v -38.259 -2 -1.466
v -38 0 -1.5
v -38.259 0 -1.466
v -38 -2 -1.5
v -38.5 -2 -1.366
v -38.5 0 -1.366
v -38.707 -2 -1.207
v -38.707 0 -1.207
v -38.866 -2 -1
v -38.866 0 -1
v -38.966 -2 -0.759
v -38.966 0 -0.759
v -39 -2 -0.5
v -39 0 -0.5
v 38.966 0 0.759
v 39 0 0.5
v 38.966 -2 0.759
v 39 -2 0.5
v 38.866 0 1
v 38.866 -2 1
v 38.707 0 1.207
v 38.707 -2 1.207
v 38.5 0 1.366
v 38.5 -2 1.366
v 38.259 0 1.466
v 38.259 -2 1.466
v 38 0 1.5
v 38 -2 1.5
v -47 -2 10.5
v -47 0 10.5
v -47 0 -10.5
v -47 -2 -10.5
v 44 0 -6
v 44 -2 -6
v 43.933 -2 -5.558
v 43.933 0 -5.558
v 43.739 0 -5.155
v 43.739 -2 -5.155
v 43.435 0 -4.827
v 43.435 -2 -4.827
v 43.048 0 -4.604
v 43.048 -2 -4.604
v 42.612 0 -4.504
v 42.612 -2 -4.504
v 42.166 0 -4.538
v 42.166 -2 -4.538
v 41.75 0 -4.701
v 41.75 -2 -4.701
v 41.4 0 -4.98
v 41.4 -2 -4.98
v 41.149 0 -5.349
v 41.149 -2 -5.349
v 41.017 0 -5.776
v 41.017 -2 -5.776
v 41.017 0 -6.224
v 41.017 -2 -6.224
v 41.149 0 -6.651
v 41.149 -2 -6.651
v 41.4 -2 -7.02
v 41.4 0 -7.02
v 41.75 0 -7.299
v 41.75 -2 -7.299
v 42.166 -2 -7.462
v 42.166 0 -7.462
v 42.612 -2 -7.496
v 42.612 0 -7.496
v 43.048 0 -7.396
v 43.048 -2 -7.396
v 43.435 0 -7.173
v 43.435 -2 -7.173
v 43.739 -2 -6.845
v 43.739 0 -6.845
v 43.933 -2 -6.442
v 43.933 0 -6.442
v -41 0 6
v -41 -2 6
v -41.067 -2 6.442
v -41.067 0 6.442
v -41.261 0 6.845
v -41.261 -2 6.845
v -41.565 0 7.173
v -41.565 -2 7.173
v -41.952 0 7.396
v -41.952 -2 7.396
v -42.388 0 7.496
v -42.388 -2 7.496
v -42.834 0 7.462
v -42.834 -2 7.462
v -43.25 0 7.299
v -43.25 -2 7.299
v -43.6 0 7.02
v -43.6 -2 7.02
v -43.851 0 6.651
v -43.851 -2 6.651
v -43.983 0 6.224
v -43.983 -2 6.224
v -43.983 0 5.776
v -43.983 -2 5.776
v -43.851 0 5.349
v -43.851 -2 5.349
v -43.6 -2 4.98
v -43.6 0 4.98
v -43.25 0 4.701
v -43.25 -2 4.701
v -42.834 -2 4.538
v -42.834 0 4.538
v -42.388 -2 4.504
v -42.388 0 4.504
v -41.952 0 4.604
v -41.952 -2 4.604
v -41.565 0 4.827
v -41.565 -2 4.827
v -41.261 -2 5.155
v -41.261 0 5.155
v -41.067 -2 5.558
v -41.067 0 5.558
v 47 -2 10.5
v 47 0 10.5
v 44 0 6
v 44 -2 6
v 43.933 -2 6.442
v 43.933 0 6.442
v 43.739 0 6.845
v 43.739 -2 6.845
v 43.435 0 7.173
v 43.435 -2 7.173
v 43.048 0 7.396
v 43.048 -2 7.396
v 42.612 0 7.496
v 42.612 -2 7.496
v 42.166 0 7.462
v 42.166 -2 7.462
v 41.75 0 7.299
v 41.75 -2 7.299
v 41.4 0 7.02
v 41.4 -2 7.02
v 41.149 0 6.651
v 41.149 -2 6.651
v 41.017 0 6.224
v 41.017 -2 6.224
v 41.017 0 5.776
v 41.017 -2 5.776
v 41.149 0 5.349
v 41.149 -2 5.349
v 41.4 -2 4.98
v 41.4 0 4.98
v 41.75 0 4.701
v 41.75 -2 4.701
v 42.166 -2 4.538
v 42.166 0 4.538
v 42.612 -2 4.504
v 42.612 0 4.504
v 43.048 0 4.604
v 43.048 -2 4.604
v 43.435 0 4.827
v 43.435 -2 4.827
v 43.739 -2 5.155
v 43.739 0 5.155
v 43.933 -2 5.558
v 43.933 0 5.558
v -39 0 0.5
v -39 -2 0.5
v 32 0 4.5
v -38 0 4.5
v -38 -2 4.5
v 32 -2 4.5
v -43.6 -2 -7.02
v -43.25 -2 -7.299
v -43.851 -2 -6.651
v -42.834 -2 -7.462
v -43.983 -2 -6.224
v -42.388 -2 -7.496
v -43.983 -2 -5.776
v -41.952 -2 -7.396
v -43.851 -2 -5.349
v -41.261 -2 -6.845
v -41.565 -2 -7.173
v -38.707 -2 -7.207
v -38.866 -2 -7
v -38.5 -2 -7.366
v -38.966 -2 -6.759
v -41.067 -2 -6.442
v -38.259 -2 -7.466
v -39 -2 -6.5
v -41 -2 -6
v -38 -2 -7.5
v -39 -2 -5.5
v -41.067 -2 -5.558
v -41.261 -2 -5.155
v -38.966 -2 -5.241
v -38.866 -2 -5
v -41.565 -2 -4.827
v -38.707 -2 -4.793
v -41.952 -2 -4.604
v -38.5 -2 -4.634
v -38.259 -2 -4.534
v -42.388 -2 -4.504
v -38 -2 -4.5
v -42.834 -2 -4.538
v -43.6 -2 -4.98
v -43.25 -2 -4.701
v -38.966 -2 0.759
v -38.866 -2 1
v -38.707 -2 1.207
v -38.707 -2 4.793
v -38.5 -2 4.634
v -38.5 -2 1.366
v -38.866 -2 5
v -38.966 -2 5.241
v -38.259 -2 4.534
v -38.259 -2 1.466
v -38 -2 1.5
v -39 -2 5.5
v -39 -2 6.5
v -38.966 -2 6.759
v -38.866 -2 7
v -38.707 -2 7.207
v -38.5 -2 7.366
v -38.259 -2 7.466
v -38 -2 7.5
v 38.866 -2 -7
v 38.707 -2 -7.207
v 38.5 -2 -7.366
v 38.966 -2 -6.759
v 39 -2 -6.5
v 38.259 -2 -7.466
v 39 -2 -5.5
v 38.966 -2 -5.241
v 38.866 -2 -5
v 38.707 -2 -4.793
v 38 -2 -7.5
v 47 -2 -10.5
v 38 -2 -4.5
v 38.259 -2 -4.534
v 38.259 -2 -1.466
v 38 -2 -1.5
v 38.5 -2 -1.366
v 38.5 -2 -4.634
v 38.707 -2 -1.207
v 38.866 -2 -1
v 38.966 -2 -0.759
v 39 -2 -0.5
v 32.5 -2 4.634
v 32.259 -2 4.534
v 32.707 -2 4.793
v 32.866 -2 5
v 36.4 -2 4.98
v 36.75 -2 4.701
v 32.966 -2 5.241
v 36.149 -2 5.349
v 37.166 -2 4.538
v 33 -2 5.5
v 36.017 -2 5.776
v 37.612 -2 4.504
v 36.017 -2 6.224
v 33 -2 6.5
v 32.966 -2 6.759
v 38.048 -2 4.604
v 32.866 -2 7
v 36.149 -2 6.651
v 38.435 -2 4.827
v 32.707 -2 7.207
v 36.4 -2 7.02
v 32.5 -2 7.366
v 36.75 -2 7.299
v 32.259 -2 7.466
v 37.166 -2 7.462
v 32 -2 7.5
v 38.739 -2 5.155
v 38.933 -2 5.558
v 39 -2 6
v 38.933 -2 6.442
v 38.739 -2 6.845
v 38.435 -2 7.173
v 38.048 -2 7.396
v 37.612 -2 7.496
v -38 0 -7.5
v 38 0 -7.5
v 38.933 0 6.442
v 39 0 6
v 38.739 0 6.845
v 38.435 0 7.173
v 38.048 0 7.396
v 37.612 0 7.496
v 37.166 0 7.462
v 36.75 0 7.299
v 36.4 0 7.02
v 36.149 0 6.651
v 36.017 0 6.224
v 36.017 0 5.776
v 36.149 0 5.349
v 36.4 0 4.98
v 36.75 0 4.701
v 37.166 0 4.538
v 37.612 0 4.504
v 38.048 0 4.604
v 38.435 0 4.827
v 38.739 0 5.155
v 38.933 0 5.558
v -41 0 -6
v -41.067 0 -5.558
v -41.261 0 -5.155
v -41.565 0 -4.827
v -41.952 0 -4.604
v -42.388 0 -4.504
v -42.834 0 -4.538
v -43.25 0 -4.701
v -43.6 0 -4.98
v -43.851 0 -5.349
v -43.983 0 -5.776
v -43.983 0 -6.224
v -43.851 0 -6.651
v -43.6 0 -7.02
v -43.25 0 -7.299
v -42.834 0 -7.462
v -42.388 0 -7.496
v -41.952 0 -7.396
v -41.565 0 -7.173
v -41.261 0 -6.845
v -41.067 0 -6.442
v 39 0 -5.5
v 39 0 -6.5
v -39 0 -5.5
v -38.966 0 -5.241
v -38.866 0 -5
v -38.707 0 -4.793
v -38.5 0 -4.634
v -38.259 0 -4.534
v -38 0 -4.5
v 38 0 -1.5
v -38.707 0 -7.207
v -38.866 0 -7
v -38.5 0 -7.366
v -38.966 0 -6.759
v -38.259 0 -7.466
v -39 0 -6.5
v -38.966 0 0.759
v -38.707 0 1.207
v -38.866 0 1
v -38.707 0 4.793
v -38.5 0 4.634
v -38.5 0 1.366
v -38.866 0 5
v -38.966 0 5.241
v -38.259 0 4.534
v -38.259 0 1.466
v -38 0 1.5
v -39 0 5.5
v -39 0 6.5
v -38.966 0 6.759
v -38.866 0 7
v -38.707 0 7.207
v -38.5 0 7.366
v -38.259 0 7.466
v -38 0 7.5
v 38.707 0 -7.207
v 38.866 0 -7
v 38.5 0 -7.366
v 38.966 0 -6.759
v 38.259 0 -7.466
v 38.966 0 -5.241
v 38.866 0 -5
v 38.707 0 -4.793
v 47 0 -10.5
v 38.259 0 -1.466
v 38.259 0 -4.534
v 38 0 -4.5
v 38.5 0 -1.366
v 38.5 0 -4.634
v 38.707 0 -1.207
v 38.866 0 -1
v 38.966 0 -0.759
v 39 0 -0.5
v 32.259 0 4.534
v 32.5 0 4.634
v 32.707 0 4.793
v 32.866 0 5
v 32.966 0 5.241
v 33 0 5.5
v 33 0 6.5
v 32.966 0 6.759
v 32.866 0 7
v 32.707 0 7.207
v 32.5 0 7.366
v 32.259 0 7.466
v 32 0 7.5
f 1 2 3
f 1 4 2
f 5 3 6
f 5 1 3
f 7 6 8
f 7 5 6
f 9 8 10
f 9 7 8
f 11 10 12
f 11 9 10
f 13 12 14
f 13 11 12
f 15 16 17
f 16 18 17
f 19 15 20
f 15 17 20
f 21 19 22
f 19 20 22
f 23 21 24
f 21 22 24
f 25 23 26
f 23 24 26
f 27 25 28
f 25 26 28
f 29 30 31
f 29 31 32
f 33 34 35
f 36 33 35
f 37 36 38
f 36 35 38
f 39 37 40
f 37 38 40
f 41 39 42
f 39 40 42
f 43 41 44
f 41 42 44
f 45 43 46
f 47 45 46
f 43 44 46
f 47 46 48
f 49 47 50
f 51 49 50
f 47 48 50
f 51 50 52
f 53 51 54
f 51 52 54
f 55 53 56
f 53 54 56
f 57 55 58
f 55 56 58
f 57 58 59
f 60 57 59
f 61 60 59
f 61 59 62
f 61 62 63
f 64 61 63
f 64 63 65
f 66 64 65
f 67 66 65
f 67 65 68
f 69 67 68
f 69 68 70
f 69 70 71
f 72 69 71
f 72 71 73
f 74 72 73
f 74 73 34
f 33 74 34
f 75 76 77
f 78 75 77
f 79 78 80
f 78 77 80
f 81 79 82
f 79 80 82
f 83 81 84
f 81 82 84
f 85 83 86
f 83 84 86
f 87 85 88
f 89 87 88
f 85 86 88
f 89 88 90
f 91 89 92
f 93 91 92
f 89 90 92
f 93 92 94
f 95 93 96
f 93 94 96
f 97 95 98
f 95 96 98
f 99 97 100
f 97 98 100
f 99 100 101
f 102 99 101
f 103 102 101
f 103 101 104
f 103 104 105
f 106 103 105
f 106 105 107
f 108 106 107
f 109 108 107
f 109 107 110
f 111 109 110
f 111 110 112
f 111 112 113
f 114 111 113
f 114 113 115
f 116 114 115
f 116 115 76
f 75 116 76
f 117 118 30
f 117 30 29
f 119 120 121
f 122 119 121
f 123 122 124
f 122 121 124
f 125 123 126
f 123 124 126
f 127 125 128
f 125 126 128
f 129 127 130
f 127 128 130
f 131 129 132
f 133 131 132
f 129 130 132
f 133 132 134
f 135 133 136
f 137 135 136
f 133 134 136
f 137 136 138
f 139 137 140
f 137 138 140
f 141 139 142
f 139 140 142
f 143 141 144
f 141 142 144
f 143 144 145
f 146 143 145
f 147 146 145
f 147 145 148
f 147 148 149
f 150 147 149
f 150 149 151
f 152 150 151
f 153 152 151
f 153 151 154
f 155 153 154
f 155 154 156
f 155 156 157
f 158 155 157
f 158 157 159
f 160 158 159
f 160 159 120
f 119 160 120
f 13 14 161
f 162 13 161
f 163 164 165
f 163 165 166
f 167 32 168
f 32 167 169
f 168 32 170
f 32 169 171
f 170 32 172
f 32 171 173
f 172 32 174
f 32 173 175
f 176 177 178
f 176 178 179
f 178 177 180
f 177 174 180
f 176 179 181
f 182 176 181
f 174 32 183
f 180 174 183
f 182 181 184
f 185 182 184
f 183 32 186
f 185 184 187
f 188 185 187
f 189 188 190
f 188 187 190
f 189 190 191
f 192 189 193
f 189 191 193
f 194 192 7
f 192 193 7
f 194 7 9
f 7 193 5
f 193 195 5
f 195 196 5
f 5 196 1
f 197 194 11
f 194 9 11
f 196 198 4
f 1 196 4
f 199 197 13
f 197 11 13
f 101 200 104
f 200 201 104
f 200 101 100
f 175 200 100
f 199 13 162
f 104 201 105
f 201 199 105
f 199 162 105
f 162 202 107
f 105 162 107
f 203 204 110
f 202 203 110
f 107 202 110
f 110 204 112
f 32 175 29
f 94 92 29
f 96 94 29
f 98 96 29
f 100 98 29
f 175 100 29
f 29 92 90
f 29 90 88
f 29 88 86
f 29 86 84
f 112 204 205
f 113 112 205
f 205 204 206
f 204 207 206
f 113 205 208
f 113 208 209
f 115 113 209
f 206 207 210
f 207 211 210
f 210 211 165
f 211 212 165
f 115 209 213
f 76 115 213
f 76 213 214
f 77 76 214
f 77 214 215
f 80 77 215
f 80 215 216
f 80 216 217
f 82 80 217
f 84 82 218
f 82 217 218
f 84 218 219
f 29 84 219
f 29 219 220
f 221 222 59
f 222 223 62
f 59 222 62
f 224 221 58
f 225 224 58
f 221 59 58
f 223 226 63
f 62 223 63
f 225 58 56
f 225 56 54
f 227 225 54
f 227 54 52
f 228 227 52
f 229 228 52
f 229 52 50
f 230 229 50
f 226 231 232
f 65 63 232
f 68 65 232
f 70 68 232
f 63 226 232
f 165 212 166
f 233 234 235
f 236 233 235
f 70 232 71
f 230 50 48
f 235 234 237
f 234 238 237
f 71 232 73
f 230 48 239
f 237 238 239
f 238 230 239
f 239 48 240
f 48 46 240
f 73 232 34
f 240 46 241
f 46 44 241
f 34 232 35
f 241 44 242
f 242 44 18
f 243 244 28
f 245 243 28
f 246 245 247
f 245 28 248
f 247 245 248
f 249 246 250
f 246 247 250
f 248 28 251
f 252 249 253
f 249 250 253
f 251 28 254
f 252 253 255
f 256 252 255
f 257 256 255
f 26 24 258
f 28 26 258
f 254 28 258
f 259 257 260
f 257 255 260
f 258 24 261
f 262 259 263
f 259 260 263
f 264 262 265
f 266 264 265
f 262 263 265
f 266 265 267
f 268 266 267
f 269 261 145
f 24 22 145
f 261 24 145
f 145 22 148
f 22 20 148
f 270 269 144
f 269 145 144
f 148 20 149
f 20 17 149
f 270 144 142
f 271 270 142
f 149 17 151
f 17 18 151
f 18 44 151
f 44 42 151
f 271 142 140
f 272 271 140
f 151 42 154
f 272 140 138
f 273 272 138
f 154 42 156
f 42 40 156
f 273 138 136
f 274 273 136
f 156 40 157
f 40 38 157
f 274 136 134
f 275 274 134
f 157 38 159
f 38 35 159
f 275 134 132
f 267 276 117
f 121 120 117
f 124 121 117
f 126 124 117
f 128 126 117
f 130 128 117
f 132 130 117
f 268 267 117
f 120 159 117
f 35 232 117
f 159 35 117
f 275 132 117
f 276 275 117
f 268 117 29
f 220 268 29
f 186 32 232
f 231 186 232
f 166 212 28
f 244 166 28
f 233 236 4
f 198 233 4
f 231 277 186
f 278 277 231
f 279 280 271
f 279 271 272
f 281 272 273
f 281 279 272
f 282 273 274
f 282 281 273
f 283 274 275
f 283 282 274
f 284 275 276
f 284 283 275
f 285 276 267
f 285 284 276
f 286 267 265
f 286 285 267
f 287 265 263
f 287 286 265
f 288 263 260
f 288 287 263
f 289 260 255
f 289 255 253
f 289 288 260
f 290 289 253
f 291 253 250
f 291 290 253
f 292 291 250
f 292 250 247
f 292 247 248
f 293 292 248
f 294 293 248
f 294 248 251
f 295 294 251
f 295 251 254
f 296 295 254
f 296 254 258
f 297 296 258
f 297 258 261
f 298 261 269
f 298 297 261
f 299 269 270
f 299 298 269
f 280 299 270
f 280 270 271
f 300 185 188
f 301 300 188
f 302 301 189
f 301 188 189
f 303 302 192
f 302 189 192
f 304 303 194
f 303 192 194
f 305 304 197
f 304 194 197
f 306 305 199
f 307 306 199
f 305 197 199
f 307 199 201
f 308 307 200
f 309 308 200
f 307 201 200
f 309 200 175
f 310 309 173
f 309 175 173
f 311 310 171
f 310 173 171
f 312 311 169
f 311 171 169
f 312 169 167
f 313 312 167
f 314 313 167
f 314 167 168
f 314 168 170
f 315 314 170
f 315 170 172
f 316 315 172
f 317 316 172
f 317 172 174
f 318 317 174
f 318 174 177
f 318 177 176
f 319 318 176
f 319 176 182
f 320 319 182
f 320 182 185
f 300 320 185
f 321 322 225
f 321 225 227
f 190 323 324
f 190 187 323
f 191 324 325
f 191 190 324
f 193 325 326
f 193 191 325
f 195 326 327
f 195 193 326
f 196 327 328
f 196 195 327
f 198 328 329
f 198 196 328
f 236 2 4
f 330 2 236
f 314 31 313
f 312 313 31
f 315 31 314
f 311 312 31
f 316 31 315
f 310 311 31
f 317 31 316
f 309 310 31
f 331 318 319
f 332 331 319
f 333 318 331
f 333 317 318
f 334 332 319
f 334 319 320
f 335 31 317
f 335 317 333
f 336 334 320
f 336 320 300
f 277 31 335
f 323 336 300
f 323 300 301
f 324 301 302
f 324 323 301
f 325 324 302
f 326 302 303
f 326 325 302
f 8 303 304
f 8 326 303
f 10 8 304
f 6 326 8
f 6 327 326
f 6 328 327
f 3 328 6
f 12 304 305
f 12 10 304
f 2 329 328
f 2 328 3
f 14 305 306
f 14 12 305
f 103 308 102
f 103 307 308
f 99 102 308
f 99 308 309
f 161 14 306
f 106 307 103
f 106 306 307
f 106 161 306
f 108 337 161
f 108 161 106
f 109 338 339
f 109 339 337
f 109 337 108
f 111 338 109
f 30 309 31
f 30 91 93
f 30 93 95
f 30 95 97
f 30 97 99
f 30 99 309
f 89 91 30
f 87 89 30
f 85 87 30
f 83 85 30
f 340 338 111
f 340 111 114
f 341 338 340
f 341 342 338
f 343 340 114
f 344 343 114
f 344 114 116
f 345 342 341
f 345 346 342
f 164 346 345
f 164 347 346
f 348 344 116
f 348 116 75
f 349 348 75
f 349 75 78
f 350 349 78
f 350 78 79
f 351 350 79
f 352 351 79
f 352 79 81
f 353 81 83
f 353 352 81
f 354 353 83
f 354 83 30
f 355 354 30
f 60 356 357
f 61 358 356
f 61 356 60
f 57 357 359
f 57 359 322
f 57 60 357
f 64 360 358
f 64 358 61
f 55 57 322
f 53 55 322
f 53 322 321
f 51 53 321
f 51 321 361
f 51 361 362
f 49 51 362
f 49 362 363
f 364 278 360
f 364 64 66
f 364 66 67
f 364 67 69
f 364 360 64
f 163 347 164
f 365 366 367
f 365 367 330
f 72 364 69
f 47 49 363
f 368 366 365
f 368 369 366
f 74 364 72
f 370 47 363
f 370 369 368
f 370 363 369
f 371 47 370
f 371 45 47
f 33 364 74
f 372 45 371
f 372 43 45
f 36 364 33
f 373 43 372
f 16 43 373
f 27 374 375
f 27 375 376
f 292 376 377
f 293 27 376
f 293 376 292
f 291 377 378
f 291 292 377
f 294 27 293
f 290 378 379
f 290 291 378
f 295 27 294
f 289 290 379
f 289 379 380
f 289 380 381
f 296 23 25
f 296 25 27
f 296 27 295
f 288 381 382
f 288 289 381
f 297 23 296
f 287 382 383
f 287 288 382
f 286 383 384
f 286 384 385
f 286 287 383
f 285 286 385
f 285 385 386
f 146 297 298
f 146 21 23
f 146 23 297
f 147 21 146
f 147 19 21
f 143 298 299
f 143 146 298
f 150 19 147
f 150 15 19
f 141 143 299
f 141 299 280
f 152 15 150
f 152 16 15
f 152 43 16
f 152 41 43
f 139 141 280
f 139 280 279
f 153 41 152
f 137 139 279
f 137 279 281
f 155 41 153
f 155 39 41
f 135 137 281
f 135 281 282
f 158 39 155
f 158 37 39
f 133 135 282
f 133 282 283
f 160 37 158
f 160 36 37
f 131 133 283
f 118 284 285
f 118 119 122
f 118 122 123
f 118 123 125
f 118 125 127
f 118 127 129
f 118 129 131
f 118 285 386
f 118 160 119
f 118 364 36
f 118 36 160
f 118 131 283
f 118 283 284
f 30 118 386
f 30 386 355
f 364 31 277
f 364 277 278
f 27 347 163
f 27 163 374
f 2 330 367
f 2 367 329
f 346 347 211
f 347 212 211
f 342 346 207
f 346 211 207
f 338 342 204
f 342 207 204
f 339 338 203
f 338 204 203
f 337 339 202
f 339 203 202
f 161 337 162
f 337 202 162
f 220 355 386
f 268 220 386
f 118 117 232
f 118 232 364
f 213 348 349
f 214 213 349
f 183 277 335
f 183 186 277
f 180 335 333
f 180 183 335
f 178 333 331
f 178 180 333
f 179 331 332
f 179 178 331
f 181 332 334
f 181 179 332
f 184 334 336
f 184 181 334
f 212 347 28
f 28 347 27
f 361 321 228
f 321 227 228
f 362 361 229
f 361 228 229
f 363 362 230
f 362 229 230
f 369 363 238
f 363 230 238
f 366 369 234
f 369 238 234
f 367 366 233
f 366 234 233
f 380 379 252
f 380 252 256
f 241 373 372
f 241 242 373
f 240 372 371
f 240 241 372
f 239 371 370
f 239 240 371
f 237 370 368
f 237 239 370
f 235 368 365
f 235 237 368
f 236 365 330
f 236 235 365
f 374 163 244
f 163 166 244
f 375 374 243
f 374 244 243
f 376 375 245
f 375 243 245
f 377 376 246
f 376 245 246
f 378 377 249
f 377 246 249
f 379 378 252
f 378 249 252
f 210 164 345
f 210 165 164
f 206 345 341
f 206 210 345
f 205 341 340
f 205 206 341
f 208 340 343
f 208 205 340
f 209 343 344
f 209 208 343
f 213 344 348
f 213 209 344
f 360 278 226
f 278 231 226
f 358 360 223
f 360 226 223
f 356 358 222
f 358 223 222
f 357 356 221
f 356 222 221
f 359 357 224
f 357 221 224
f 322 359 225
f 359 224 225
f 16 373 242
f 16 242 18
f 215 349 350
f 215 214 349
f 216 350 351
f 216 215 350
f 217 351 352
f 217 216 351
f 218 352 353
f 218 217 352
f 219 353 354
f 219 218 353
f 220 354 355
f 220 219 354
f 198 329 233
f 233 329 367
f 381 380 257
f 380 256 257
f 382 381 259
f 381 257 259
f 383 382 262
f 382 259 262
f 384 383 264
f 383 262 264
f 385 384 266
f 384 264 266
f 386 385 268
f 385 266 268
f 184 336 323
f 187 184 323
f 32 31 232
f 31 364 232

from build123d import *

# Parameters (mm, degrees)
F0_W     = 84
F0_H     = 21
F0_W_2   = 78
F0_H_2   = 3
F0_W_3   = 72
F0_R     = 1.5
F1_DEPTH = 2
F2_W     = 2
F2_H     = 21
F3_DEPTH = 5
F4_W     = 2
F4_H     = 21
F5_DEPTH = 5
F6_R     = 1.5
F7_DEPTH = 25
F8_R     = 1


with BuildPart() as f1:
    # F0 (on Front) → F1 (new body)
    with BuildSketch(Plane.XZ):
        Rectangle(F0_W, F0_H)
        with Locations((0, -6)):
            Rectangle(F0_W_2, F0_H_2, mode=Mode.SUBTRACT)
        with Locations((-3, 6)):
            Rectangle(F0_W_3, F0_H_2, mode=Mode.SUBTRACT)
        Rectangle(F0_W_2, F0_H_2, mode=Mode.SUBTRACT)
        with Locations((37.5, 6)):
            Circle(F0_R, mode=Mode.SUBTRACT)
    extrude(amount=F1_DEPTH)

    # F2 (on face) → F3 (join)
    with BuildSketch(Plane.YZ.offset(42)):
        with Locations((-1, 0)):
            Rectangle(F2_W, F2_H)
    extrude(amount=F3_DEPTH)

    # F4 (on face) → F5 (join)
    with BuildSketch(Plane(origin=(-42, 0, 0), x_dir=(0, -1, 0), z_dir=(-1, 0, 0))):
        with Locations((1, 0)):
            Rectangle(F4_W, F4_H)
    extrude(amount=F5_DEPTH)

    # F6 (on face) → F7 (cut)
    with BuildSketch(Plane.XZ.offset(2)):
        with Locations((-42.5, 6)):
            Circle(F6_R)
        with Locations((-42.5, -6)):
            Circle(F6_R)
        with Locations((42.5, 6)):
            Circle(F6_R)
        with Locations((42.5, -6)):
            Circle(F6_R)
    extrude(amount=-F7_DEPTH, mode=Mode.SUBTRACT)

    # F8
    f8_edges = [f1.edges().sort_by_distance(p)[0] for p in [
        (-39, -1, 7.5),
        (-39, -1, 1.5),
        (-39, -1, -4.5),
        (-39, -1, 4.5),
        (-39, -1, -1.5),
        (-39, -1, -7.5),
        (33, -1, 7.5),
        (39, -1, 1.5),
        (39, -1, -4.5),
        (39, -1, -7.5),
        (39, -1, -1.5),
        (33, -1, 4.5),
    ]]
    fillet(f8_edges, radius=F8_R)


solid = f1.part
